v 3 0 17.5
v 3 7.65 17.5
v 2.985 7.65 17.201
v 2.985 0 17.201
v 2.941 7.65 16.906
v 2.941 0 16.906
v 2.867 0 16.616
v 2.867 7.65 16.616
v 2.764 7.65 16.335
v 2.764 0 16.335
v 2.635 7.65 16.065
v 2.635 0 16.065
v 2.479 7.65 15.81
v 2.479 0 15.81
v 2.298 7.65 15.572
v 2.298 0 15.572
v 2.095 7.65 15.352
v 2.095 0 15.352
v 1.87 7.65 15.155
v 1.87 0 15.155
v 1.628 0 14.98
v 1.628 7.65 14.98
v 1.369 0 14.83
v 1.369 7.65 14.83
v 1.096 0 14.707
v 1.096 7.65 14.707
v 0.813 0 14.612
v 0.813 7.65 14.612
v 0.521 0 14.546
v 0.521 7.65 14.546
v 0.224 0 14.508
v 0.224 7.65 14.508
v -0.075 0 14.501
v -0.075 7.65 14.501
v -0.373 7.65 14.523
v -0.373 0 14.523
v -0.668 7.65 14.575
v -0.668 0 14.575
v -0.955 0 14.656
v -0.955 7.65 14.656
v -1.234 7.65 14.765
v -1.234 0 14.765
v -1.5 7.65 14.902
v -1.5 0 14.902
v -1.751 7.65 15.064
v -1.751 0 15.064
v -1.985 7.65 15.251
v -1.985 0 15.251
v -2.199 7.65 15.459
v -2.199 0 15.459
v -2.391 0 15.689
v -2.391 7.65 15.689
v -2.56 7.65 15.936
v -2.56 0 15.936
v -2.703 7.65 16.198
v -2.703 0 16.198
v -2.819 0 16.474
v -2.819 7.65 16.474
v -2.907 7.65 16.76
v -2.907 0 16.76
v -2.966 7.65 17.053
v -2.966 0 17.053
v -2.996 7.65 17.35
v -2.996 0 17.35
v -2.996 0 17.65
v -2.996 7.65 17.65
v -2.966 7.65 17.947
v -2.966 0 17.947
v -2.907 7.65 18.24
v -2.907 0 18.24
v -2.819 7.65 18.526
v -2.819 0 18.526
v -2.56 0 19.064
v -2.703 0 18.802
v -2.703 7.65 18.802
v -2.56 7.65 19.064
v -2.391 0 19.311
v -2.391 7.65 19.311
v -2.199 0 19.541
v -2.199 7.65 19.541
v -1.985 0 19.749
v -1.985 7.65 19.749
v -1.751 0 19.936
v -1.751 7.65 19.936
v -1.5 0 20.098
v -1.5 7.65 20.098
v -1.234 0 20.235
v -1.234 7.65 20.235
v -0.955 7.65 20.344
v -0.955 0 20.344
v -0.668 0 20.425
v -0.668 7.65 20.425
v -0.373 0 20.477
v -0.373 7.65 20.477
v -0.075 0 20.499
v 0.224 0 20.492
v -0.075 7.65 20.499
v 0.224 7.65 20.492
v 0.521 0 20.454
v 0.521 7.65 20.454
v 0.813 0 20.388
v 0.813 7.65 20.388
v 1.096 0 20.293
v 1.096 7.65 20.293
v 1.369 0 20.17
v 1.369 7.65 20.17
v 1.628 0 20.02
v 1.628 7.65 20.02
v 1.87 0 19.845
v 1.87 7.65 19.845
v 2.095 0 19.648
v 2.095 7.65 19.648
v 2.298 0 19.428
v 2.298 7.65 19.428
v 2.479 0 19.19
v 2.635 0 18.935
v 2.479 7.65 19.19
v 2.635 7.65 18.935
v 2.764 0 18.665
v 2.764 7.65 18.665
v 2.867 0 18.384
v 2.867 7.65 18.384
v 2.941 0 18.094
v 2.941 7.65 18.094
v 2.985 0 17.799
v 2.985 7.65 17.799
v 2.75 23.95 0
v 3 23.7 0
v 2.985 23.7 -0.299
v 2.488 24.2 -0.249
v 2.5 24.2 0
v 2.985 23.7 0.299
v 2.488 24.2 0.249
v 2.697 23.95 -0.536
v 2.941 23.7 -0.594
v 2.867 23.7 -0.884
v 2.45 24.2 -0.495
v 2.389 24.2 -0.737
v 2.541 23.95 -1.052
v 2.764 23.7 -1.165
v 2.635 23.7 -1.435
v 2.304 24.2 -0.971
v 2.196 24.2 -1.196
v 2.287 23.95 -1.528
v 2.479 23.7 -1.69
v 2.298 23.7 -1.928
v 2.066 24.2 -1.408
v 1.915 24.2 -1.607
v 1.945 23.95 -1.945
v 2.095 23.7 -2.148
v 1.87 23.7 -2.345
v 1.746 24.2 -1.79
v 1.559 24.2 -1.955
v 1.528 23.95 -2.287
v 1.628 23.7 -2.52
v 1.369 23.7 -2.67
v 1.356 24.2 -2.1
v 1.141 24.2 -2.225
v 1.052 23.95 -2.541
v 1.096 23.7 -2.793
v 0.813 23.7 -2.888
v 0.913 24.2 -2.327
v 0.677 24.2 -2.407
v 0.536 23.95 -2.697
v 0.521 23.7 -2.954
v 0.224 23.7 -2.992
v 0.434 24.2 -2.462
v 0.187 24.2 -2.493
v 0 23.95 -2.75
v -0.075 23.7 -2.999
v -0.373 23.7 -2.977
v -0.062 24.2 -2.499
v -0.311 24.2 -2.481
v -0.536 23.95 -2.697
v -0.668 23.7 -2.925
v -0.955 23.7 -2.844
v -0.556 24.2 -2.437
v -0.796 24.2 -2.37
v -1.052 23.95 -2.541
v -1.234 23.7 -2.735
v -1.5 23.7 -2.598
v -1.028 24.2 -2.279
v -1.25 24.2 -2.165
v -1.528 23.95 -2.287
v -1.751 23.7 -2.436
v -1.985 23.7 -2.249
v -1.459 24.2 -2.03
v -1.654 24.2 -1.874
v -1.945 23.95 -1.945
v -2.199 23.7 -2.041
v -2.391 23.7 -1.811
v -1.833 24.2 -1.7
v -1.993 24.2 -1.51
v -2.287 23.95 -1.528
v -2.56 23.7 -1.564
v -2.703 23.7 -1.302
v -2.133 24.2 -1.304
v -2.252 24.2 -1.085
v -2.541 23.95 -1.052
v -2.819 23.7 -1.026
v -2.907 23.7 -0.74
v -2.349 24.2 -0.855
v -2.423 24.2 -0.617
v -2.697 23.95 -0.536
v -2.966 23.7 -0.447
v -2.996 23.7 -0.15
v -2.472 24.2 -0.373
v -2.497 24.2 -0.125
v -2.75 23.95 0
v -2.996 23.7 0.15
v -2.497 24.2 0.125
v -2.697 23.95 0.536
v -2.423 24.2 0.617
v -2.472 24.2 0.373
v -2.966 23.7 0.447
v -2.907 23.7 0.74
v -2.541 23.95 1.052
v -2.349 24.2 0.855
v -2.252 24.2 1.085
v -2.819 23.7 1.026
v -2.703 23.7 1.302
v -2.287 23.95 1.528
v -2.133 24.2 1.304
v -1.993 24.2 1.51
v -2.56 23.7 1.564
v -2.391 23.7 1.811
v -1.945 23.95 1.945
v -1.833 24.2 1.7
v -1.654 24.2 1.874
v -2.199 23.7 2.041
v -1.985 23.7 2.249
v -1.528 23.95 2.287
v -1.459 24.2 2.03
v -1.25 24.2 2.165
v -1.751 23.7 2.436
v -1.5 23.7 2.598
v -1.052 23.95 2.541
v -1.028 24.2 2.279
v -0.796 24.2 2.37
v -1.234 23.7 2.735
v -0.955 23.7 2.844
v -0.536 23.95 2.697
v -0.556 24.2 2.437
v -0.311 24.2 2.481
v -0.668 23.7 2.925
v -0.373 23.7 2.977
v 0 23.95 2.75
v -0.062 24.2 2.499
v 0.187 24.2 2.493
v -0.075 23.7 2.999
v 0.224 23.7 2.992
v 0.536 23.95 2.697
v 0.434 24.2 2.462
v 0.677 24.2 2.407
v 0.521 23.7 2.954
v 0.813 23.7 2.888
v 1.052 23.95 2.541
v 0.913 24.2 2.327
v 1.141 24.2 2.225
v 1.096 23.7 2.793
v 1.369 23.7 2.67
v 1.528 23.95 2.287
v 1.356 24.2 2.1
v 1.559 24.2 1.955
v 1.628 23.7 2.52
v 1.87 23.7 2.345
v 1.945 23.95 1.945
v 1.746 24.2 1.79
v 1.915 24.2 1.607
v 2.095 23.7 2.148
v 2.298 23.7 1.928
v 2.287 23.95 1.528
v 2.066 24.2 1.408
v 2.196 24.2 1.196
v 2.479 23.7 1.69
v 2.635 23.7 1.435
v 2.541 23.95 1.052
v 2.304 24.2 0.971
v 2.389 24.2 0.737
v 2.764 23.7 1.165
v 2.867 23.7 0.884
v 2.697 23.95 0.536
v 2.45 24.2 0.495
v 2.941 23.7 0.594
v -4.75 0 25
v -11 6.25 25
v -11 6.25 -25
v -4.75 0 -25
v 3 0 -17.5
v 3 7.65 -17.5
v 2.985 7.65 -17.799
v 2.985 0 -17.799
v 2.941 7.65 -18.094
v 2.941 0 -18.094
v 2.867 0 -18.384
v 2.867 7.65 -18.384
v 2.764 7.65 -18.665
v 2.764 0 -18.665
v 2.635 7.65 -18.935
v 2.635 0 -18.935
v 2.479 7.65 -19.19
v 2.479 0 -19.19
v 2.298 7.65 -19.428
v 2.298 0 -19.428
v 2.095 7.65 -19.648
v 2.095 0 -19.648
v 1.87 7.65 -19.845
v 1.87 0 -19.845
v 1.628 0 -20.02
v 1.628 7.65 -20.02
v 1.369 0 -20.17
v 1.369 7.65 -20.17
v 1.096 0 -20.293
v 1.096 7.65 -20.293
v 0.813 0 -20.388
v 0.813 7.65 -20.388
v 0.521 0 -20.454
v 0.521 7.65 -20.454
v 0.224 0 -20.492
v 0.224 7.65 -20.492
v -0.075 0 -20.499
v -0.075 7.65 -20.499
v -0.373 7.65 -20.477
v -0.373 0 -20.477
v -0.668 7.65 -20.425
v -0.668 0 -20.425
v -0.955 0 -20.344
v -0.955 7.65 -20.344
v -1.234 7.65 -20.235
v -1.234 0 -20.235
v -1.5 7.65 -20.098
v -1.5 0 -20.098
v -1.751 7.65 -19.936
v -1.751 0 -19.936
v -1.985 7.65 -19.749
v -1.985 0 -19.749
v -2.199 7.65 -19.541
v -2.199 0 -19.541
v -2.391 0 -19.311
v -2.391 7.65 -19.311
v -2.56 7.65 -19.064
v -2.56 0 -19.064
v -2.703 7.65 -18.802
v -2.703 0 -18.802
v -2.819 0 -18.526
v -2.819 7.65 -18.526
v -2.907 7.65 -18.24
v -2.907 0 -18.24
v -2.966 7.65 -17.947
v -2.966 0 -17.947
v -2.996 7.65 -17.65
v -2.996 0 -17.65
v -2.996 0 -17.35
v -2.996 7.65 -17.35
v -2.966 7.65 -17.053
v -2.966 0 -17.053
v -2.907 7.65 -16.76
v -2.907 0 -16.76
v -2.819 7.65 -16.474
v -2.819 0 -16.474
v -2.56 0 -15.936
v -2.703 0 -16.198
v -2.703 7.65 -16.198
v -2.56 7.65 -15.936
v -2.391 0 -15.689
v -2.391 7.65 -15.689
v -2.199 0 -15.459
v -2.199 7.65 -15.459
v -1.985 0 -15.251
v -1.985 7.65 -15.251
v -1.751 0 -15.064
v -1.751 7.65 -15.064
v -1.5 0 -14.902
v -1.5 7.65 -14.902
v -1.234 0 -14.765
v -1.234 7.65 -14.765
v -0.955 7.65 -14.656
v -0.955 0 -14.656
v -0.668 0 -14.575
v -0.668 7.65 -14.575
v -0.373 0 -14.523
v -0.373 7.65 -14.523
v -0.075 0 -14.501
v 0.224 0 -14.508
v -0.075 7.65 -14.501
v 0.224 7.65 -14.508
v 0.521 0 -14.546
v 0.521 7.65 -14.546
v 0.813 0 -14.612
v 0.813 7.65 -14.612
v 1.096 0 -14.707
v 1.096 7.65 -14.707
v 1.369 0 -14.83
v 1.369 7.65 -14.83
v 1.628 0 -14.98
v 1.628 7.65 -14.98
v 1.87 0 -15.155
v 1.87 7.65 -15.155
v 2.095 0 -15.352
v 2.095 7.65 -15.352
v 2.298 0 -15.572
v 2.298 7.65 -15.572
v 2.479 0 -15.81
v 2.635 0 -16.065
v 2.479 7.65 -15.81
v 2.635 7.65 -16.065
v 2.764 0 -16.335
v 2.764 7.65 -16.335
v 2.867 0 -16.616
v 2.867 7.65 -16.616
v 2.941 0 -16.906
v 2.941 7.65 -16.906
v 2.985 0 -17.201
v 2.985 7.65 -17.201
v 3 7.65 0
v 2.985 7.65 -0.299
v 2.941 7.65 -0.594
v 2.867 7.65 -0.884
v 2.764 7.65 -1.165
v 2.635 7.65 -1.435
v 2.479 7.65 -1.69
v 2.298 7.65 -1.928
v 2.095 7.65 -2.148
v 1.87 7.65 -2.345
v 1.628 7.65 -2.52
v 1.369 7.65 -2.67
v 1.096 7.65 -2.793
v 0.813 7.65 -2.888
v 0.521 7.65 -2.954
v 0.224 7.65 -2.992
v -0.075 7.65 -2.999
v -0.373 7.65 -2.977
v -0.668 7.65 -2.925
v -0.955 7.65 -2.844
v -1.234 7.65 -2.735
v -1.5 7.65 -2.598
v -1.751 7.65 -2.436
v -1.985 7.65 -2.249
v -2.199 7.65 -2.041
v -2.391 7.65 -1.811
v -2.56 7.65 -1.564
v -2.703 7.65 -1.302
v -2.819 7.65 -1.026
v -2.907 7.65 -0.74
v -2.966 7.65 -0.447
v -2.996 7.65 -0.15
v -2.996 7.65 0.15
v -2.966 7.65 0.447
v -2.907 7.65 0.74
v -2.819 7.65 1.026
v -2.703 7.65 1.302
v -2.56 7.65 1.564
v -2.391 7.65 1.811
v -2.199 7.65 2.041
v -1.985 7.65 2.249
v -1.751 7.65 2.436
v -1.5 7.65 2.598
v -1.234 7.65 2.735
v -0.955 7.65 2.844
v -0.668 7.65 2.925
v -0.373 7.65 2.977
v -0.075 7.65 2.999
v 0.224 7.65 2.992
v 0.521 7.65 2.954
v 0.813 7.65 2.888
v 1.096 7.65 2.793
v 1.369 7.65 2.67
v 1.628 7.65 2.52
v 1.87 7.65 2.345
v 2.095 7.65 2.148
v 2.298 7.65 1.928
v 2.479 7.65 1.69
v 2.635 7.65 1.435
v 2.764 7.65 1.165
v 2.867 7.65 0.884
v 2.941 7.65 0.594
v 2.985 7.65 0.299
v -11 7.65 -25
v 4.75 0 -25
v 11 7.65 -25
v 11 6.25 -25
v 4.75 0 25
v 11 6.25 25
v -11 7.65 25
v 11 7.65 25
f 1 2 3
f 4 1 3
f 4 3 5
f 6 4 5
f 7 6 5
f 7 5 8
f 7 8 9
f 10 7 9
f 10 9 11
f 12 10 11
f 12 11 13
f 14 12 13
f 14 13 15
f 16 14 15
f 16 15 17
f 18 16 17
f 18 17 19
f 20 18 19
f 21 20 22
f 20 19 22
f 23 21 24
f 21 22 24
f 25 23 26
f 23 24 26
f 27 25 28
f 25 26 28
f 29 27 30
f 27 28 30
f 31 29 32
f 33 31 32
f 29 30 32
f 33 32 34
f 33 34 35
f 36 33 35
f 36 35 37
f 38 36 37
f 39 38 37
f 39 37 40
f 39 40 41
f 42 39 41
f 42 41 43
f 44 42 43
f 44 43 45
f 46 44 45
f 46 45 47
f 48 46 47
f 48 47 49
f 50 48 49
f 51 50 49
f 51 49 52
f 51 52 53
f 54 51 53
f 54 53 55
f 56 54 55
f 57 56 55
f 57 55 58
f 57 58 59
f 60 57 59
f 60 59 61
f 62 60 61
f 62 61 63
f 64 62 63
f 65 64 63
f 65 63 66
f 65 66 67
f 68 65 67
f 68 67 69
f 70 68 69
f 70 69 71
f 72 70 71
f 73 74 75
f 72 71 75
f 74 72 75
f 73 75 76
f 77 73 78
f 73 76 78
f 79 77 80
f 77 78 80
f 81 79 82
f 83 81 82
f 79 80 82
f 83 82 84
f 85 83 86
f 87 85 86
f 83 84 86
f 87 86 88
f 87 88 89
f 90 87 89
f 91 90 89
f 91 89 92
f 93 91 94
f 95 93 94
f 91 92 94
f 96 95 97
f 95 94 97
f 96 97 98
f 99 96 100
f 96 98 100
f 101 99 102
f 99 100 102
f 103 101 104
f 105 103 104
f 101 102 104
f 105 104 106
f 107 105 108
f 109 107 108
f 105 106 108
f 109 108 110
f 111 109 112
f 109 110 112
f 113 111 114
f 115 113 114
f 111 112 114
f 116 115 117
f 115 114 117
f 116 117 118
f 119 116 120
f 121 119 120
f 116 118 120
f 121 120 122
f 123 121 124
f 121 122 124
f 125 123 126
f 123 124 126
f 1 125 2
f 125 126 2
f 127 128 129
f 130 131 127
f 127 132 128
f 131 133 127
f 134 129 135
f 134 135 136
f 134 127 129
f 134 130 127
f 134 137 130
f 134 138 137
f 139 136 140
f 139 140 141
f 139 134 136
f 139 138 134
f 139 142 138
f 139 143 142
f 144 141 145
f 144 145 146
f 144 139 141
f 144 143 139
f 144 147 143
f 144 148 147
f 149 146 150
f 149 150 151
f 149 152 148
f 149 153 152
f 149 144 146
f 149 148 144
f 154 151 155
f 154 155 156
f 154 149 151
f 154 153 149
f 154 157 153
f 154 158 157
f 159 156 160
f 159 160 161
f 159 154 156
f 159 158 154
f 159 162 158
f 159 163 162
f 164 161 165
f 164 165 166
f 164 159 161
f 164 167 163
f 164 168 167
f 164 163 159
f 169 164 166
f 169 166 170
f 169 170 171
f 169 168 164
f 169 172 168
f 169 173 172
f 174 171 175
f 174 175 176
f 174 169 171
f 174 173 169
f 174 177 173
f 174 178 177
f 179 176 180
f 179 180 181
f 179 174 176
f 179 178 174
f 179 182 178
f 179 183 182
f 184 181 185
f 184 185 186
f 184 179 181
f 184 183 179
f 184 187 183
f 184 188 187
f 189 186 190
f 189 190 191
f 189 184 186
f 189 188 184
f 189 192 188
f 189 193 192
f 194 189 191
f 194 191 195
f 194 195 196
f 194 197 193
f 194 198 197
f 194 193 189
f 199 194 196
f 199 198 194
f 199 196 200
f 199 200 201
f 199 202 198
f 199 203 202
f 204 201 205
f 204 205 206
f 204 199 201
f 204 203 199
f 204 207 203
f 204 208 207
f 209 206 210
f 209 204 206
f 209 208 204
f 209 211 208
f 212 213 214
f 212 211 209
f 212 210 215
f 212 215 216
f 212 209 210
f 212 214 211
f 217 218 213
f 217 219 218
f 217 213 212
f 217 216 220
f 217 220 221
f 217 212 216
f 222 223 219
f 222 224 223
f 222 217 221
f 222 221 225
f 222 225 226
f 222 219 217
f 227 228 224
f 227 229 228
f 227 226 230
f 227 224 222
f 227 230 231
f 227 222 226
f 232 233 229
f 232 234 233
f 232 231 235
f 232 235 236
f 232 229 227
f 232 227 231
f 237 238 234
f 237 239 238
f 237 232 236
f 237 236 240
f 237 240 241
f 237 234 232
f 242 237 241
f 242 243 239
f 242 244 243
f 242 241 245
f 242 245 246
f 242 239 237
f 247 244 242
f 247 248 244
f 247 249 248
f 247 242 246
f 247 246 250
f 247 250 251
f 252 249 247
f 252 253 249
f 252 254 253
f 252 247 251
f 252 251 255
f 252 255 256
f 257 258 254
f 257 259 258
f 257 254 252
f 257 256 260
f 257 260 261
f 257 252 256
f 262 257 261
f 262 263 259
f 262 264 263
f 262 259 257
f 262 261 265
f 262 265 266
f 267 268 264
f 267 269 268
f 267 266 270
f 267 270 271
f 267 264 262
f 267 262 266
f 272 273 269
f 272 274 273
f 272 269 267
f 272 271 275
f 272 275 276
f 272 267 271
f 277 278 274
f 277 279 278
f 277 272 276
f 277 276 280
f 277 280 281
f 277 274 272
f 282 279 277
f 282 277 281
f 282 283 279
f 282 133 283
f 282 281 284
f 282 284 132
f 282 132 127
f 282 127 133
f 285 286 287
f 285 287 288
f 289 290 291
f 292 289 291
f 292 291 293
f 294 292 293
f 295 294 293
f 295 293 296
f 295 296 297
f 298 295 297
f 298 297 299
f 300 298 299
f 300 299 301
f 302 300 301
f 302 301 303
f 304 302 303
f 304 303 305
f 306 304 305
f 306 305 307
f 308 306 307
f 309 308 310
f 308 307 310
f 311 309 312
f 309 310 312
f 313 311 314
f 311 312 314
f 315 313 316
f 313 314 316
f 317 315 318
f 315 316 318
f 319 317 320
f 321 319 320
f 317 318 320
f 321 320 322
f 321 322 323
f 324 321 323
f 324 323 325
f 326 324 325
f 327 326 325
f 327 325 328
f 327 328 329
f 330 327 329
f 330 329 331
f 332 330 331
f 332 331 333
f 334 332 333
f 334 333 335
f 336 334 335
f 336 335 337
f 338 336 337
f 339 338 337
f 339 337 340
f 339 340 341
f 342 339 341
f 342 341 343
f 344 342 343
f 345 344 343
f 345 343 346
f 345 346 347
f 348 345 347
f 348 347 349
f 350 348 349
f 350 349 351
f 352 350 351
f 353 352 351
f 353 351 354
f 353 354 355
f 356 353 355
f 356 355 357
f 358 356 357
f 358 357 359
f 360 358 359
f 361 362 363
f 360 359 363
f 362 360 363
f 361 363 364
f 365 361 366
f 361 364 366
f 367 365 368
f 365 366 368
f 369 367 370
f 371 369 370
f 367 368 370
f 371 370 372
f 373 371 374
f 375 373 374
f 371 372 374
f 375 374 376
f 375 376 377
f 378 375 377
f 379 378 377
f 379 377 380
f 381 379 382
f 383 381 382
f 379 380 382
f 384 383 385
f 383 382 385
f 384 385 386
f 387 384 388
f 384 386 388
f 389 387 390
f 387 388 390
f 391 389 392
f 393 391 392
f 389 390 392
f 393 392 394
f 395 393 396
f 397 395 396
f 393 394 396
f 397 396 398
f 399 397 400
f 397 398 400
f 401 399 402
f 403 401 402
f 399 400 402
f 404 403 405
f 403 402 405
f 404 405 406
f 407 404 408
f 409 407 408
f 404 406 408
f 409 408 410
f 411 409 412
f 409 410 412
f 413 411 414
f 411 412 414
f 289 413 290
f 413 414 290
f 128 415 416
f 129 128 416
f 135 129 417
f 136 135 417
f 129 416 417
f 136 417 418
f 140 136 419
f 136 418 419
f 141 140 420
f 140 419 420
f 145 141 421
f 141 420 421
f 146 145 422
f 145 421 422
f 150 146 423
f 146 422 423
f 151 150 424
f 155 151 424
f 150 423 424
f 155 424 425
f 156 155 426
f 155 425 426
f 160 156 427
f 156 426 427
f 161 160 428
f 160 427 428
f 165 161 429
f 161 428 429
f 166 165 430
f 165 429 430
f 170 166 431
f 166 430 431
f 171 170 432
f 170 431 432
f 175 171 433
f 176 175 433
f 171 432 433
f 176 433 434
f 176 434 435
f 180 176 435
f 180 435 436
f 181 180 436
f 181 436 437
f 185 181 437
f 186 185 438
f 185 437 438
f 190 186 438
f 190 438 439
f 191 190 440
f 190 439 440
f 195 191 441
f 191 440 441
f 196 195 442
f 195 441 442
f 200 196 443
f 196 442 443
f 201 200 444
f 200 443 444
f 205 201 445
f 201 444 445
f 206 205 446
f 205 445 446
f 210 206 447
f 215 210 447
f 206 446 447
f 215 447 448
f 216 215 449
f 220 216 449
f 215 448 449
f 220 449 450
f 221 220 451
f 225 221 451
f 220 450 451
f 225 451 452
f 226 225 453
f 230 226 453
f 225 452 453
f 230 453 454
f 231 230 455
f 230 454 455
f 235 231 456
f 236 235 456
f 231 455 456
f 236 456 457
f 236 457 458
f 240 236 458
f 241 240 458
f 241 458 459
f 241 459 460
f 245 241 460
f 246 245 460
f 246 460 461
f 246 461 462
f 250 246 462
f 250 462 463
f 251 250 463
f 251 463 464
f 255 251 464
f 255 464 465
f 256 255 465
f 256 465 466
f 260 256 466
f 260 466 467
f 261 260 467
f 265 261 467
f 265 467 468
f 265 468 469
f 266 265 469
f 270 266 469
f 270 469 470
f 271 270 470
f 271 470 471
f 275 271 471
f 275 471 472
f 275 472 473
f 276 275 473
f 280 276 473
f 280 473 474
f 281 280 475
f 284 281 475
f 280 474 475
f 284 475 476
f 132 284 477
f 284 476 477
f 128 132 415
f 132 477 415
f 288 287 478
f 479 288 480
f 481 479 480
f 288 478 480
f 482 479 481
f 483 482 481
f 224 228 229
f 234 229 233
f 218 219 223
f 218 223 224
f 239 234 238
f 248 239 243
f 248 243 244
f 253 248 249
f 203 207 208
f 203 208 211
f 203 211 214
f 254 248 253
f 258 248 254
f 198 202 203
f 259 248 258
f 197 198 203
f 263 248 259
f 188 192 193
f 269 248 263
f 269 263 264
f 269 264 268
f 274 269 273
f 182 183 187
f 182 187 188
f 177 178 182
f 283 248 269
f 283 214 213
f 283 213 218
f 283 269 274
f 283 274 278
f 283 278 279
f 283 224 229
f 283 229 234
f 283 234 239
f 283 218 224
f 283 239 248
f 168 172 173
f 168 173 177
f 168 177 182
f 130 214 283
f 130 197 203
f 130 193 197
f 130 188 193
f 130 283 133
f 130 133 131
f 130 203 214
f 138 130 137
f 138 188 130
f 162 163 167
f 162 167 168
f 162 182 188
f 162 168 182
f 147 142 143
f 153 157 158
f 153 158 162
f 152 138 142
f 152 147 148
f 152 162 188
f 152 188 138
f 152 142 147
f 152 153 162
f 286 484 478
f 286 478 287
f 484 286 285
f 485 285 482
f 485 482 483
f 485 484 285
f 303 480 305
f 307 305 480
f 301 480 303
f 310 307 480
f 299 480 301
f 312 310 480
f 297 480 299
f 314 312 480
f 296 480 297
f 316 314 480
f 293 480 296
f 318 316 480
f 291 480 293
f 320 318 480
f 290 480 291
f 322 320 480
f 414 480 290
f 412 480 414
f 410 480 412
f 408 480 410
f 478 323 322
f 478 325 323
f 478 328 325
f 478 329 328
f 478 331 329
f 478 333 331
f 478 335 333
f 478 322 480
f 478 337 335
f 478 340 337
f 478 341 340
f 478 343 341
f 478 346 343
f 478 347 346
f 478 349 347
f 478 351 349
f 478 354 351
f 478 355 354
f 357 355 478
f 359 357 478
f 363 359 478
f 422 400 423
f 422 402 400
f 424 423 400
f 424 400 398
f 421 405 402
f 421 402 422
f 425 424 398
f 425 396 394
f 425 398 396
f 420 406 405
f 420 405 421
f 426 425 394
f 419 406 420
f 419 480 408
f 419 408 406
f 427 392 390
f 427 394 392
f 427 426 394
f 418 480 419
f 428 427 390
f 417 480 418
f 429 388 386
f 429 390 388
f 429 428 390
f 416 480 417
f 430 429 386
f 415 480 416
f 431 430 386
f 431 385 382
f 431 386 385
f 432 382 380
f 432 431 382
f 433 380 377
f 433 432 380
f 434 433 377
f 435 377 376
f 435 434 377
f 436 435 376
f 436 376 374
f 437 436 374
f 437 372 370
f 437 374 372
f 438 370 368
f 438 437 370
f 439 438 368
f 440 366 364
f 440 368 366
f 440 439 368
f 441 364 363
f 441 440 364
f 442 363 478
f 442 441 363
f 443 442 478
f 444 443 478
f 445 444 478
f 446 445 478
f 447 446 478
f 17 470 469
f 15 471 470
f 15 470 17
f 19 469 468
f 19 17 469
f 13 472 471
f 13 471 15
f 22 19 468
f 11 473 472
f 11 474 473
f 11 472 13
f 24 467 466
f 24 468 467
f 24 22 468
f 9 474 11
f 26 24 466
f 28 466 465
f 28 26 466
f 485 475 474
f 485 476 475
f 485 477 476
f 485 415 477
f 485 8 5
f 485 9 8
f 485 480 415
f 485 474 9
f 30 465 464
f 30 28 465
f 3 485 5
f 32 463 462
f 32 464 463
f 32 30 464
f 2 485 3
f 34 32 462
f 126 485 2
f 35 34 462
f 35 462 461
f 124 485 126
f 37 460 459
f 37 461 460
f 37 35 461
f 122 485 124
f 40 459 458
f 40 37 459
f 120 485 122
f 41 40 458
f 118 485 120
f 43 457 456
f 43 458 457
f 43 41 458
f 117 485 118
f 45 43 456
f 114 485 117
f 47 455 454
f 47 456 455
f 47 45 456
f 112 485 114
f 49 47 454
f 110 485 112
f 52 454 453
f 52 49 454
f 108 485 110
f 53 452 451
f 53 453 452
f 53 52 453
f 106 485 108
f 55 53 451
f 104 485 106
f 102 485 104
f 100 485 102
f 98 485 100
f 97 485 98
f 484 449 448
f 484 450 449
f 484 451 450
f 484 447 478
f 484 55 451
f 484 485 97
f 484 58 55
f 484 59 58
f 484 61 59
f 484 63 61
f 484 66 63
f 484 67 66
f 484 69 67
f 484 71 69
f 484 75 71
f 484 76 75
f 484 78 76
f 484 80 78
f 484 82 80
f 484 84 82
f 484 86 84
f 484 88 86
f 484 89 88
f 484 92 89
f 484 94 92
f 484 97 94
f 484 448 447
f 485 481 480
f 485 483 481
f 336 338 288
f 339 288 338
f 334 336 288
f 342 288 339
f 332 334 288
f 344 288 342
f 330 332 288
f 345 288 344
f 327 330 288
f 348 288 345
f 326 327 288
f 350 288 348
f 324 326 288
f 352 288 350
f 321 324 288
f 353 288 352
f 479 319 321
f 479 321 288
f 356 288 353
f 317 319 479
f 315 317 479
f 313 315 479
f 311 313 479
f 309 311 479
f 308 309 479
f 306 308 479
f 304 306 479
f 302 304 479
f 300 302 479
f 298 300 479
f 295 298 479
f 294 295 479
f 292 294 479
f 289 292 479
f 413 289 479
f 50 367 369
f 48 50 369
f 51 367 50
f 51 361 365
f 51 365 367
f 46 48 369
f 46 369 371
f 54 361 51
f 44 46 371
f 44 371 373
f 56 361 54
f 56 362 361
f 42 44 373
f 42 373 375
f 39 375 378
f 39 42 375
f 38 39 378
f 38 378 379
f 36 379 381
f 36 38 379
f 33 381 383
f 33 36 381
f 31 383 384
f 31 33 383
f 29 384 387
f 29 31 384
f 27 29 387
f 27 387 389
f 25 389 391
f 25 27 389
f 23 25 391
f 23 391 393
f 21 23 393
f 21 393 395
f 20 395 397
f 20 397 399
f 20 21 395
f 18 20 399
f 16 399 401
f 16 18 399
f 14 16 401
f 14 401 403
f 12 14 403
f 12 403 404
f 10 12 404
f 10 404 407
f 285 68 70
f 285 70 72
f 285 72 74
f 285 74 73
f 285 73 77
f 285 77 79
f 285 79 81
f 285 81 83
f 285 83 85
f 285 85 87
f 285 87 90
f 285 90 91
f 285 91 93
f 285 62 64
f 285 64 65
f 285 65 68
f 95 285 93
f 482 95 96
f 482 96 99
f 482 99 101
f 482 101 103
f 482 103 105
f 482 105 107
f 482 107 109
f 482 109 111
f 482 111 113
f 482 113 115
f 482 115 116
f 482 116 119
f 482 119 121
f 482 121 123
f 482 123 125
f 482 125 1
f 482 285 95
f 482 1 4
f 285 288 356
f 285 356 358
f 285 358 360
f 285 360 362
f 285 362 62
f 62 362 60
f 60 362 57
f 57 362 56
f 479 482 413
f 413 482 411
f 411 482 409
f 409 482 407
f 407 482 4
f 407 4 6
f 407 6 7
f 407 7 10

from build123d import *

# Parameters (mm, degrees)
BOSS_EXTRUDE1_DEPTH = 25
SKETCH2_R           = 3
BOSS_EXTRUDE2_DEPTH = 16.55
SKETCH3_R           = 3
CUT_EXTRUDE1_DEPTH  = 10
CHAMFER1_SIZE       = 0.5


with BuildPart() as part:
    # Sketch1 → Boss-Extrude1 (new body, symmetric)
    with BuildSketch(Plane.XY):
        Polygon((11, 7.65), (-11, 7.65), (-11, 6.25), (-4.75, 0), (4.75, 0), (11, 6.25), align=None)
    extrude(amount=BOSS_EXTRUDE1_DEPTH, both=True)

    # Sketch2 → Boss-Extrude2 (add)
    with BuildSketch(Plane(origin=(0, 7.65, 0), x_dir=(1, 0, 0), z_dir=(0, 1, 0))):
        Circle(SKETCH2_R)
    extrude(amount=BOSS_EXTRUDE2_DEPTH)

    # Sketch3 → Cut-Extrude1 (cut)
    with BuildSketch(Plane(origin=(0, 7.65, 0), x_dir=(1, 0, 0), z_dir=(0, 1, 0))):
        with Locations((0, 17.5)):
            Circle(SKETCH3_R)
        with Locations((0, -17.5)):
            Circle(SKETCH3_R)
    extrude(amount=-CUT_EXTRUDE1_DEPTH, mode=Mode.SUBTRACT)

    # Chamfer1
    chamfer1_edges = [part.edges().sort_by_distance(p)[0] for p in [
        (-3, 24.2, 0),
    ]]
    chamfer(chamfer1_edges, length=CHAMFER1_SIZE)


solid = part.part
